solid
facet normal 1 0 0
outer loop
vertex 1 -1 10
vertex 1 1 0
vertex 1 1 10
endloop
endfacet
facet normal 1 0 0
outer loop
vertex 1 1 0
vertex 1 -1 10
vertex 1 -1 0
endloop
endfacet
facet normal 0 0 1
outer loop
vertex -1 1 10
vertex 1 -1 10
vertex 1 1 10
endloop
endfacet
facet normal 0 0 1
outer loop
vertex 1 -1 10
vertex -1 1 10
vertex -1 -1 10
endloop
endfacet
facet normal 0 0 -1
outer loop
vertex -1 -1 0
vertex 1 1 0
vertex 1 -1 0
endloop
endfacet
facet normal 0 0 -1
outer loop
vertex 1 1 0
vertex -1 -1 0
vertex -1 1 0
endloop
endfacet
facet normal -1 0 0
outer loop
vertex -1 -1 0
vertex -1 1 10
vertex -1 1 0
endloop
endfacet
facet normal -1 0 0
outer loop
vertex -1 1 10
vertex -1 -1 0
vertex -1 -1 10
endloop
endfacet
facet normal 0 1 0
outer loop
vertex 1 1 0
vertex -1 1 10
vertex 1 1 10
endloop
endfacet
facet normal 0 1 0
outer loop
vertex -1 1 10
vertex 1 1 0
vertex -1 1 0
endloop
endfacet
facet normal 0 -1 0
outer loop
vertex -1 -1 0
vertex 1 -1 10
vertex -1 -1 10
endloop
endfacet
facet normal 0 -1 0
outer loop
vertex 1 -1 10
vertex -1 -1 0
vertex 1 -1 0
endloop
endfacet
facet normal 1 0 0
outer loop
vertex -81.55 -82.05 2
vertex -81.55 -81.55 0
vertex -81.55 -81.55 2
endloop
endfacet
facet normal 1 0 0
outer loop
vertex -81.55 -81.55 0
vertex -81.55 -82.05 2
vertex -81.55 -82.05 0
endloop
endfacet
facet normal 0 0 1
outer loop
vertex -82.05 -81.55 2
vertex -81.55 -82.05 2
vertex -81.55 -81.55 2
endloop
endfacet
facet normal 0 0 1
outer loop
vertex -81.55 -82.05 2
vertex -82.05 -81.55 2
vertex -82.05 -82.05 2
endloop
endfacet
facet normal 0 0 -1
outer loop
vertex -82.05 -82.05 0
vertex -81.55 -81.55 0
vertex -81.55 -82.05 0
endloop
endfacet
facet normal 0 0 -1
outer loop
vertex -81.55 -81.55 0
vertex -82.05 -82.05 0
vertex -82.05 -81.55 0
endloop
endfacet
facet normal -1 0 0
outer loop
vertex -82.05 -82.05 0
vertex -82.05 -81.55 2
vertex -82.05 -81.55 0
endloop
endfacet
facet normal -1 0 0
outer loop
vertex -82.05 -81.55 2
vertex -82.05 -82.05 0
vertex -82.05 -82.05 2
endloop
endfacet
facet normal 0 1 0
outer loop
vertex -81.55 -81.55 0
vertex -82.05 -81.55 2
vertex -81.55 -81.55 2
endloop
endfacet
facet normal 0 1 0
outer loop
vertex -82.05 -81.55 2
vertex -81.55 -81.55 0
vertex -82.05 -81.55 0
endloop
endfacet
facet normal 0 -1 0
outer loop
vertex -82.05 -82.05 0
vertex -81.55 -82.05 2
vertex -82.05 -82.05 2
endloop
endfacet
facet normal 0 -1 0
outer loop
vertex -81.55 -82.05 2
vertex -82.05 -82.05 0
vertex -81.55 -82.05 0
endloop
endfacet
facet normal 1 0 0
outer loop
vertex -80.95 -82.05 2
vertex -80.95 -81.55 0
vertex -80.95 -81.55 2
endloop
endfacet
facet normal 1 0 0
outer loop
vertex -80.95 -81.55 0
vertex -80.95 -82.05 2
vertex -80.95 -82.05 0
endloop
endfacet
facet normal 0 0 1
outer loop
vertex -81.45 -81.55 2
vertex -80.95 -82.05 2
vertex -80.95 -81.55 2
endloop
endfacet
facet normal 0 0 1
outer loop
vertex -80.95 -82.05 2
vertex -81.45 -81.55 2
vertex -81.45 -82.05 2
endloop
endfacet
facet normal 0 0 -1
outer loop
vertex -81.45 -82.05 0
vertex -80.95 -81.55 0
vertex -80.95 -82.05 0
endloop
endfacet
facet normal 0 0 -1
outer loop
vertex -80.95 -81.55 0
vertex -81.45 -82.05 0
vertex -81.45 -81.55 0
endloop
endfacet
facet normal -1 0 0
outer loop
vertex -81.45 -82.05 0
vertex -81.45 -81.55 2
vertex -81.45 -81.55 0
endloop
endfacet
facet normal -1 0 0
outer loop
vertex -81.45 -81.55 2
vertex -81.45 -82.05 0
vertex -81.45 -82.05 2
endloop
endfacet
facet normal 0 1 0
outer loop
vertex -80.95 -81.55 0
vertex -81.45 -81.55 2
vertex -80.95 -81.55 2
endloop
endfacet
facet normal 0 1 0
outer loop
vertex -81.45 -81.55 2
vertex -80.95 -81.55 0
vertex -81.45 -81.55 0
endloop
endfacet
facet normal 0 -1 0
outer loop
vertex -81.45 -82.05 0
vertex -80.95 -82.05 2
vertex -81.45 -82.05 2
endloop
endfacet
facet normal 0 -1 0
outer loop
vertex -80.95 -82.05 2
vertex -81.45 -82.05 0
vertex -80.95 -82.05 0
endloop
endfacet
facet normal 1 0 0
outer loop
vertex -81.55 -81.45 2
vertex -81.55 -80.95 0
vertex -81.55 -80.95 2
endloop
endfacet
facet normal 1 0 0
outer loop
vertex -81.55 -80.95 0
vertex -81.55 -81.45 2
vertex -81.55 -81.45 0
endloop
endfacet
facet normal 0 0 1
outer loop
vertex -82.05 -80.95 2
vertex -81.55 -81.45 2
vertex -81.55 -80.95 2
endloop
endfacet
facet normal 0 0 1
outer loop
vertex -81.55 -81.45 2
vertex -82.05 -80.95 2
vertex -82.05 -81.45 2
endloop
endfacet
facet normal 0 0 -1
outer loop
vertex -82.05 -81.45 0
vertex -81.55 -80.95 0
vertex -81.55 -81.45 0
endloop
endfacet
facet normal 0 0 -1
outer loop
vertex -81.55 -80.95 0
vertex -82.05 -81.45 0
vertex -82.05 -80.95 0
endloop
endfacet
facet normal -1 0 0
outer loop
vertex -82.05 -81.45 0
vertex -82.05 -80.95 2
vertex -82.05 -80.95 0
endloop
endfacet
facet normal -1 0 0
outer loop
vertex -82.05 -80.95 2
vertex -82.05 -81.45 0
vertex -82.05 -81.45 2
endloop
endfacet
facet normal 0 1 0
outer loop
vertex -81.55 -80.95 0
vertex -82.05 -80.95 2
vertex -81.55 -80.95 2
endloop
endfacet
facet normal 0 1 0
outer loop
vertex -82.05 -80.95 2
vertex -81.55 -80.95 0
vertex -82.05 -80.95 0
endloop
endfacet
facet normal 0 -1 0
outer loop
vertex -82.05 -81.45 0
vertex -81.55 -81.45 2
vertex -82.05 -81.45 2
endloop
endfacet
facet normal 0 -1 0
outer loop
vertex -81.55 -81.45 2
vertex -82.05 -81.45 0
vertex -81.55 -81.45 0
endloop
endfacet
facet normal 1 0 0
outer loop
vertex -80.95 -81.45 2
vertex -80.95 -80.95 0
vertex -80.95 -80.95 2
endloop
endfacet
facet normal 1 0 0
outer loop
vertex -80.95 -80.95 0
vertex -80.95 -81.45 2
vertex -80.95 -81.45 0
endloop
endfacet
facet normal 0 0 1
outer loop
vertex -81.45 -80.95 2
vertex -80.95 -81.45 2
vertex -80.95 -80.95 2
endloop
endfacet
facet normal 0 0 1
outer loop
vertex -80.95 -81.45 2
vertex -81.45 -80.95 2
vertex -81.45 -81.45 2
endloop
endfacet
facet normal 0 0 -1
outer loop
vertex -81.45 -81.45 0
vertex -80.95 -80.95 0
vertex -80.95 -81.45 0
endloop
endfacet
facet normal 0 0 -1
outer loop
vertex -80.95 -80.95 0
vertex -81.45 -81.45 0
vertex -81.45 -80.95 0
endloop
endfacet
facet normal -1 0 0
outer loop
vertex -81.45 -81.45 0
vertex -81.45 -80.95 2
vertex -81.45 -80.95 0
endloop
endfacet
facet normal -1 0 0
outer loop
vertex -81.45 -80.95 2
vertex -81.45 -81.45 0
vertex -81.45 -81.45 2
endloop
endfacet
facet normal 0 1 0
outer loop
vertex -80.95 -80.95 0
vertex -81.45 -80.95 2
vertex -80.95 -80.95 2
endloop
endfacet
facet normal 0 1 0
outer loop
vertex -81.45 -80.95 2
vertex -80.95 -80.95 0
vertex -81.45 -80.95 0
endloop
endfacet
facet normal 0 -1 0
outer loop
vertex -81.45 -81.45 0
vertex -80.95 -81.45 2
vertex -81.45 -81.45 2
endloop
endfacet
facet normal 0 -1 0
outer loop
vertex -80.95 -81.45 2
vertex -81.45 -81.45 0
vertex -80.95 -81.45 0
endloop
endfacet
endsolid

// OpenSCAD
translate([0, 0, 5]) color([0,1,0,0.9]) cube([2, 2, 10], center=true);
translate([-81.8, -81.8, 1]) color([1,0,0]) cube([0.5, 0.5, 2], center=true);
translate([-81.2, -81.8, 1]) color([1,0,0]) cube([0.5, 0.5, 2], center=true);
translate([-81.8, -81.2, 1]) color([1,0,0]) cube([0.5, 0.5, 2], center=true);
translate([-81.2, -81.2, 1]) color([1,0,0]) cube([0.5, 0.5, 2], center=true);
